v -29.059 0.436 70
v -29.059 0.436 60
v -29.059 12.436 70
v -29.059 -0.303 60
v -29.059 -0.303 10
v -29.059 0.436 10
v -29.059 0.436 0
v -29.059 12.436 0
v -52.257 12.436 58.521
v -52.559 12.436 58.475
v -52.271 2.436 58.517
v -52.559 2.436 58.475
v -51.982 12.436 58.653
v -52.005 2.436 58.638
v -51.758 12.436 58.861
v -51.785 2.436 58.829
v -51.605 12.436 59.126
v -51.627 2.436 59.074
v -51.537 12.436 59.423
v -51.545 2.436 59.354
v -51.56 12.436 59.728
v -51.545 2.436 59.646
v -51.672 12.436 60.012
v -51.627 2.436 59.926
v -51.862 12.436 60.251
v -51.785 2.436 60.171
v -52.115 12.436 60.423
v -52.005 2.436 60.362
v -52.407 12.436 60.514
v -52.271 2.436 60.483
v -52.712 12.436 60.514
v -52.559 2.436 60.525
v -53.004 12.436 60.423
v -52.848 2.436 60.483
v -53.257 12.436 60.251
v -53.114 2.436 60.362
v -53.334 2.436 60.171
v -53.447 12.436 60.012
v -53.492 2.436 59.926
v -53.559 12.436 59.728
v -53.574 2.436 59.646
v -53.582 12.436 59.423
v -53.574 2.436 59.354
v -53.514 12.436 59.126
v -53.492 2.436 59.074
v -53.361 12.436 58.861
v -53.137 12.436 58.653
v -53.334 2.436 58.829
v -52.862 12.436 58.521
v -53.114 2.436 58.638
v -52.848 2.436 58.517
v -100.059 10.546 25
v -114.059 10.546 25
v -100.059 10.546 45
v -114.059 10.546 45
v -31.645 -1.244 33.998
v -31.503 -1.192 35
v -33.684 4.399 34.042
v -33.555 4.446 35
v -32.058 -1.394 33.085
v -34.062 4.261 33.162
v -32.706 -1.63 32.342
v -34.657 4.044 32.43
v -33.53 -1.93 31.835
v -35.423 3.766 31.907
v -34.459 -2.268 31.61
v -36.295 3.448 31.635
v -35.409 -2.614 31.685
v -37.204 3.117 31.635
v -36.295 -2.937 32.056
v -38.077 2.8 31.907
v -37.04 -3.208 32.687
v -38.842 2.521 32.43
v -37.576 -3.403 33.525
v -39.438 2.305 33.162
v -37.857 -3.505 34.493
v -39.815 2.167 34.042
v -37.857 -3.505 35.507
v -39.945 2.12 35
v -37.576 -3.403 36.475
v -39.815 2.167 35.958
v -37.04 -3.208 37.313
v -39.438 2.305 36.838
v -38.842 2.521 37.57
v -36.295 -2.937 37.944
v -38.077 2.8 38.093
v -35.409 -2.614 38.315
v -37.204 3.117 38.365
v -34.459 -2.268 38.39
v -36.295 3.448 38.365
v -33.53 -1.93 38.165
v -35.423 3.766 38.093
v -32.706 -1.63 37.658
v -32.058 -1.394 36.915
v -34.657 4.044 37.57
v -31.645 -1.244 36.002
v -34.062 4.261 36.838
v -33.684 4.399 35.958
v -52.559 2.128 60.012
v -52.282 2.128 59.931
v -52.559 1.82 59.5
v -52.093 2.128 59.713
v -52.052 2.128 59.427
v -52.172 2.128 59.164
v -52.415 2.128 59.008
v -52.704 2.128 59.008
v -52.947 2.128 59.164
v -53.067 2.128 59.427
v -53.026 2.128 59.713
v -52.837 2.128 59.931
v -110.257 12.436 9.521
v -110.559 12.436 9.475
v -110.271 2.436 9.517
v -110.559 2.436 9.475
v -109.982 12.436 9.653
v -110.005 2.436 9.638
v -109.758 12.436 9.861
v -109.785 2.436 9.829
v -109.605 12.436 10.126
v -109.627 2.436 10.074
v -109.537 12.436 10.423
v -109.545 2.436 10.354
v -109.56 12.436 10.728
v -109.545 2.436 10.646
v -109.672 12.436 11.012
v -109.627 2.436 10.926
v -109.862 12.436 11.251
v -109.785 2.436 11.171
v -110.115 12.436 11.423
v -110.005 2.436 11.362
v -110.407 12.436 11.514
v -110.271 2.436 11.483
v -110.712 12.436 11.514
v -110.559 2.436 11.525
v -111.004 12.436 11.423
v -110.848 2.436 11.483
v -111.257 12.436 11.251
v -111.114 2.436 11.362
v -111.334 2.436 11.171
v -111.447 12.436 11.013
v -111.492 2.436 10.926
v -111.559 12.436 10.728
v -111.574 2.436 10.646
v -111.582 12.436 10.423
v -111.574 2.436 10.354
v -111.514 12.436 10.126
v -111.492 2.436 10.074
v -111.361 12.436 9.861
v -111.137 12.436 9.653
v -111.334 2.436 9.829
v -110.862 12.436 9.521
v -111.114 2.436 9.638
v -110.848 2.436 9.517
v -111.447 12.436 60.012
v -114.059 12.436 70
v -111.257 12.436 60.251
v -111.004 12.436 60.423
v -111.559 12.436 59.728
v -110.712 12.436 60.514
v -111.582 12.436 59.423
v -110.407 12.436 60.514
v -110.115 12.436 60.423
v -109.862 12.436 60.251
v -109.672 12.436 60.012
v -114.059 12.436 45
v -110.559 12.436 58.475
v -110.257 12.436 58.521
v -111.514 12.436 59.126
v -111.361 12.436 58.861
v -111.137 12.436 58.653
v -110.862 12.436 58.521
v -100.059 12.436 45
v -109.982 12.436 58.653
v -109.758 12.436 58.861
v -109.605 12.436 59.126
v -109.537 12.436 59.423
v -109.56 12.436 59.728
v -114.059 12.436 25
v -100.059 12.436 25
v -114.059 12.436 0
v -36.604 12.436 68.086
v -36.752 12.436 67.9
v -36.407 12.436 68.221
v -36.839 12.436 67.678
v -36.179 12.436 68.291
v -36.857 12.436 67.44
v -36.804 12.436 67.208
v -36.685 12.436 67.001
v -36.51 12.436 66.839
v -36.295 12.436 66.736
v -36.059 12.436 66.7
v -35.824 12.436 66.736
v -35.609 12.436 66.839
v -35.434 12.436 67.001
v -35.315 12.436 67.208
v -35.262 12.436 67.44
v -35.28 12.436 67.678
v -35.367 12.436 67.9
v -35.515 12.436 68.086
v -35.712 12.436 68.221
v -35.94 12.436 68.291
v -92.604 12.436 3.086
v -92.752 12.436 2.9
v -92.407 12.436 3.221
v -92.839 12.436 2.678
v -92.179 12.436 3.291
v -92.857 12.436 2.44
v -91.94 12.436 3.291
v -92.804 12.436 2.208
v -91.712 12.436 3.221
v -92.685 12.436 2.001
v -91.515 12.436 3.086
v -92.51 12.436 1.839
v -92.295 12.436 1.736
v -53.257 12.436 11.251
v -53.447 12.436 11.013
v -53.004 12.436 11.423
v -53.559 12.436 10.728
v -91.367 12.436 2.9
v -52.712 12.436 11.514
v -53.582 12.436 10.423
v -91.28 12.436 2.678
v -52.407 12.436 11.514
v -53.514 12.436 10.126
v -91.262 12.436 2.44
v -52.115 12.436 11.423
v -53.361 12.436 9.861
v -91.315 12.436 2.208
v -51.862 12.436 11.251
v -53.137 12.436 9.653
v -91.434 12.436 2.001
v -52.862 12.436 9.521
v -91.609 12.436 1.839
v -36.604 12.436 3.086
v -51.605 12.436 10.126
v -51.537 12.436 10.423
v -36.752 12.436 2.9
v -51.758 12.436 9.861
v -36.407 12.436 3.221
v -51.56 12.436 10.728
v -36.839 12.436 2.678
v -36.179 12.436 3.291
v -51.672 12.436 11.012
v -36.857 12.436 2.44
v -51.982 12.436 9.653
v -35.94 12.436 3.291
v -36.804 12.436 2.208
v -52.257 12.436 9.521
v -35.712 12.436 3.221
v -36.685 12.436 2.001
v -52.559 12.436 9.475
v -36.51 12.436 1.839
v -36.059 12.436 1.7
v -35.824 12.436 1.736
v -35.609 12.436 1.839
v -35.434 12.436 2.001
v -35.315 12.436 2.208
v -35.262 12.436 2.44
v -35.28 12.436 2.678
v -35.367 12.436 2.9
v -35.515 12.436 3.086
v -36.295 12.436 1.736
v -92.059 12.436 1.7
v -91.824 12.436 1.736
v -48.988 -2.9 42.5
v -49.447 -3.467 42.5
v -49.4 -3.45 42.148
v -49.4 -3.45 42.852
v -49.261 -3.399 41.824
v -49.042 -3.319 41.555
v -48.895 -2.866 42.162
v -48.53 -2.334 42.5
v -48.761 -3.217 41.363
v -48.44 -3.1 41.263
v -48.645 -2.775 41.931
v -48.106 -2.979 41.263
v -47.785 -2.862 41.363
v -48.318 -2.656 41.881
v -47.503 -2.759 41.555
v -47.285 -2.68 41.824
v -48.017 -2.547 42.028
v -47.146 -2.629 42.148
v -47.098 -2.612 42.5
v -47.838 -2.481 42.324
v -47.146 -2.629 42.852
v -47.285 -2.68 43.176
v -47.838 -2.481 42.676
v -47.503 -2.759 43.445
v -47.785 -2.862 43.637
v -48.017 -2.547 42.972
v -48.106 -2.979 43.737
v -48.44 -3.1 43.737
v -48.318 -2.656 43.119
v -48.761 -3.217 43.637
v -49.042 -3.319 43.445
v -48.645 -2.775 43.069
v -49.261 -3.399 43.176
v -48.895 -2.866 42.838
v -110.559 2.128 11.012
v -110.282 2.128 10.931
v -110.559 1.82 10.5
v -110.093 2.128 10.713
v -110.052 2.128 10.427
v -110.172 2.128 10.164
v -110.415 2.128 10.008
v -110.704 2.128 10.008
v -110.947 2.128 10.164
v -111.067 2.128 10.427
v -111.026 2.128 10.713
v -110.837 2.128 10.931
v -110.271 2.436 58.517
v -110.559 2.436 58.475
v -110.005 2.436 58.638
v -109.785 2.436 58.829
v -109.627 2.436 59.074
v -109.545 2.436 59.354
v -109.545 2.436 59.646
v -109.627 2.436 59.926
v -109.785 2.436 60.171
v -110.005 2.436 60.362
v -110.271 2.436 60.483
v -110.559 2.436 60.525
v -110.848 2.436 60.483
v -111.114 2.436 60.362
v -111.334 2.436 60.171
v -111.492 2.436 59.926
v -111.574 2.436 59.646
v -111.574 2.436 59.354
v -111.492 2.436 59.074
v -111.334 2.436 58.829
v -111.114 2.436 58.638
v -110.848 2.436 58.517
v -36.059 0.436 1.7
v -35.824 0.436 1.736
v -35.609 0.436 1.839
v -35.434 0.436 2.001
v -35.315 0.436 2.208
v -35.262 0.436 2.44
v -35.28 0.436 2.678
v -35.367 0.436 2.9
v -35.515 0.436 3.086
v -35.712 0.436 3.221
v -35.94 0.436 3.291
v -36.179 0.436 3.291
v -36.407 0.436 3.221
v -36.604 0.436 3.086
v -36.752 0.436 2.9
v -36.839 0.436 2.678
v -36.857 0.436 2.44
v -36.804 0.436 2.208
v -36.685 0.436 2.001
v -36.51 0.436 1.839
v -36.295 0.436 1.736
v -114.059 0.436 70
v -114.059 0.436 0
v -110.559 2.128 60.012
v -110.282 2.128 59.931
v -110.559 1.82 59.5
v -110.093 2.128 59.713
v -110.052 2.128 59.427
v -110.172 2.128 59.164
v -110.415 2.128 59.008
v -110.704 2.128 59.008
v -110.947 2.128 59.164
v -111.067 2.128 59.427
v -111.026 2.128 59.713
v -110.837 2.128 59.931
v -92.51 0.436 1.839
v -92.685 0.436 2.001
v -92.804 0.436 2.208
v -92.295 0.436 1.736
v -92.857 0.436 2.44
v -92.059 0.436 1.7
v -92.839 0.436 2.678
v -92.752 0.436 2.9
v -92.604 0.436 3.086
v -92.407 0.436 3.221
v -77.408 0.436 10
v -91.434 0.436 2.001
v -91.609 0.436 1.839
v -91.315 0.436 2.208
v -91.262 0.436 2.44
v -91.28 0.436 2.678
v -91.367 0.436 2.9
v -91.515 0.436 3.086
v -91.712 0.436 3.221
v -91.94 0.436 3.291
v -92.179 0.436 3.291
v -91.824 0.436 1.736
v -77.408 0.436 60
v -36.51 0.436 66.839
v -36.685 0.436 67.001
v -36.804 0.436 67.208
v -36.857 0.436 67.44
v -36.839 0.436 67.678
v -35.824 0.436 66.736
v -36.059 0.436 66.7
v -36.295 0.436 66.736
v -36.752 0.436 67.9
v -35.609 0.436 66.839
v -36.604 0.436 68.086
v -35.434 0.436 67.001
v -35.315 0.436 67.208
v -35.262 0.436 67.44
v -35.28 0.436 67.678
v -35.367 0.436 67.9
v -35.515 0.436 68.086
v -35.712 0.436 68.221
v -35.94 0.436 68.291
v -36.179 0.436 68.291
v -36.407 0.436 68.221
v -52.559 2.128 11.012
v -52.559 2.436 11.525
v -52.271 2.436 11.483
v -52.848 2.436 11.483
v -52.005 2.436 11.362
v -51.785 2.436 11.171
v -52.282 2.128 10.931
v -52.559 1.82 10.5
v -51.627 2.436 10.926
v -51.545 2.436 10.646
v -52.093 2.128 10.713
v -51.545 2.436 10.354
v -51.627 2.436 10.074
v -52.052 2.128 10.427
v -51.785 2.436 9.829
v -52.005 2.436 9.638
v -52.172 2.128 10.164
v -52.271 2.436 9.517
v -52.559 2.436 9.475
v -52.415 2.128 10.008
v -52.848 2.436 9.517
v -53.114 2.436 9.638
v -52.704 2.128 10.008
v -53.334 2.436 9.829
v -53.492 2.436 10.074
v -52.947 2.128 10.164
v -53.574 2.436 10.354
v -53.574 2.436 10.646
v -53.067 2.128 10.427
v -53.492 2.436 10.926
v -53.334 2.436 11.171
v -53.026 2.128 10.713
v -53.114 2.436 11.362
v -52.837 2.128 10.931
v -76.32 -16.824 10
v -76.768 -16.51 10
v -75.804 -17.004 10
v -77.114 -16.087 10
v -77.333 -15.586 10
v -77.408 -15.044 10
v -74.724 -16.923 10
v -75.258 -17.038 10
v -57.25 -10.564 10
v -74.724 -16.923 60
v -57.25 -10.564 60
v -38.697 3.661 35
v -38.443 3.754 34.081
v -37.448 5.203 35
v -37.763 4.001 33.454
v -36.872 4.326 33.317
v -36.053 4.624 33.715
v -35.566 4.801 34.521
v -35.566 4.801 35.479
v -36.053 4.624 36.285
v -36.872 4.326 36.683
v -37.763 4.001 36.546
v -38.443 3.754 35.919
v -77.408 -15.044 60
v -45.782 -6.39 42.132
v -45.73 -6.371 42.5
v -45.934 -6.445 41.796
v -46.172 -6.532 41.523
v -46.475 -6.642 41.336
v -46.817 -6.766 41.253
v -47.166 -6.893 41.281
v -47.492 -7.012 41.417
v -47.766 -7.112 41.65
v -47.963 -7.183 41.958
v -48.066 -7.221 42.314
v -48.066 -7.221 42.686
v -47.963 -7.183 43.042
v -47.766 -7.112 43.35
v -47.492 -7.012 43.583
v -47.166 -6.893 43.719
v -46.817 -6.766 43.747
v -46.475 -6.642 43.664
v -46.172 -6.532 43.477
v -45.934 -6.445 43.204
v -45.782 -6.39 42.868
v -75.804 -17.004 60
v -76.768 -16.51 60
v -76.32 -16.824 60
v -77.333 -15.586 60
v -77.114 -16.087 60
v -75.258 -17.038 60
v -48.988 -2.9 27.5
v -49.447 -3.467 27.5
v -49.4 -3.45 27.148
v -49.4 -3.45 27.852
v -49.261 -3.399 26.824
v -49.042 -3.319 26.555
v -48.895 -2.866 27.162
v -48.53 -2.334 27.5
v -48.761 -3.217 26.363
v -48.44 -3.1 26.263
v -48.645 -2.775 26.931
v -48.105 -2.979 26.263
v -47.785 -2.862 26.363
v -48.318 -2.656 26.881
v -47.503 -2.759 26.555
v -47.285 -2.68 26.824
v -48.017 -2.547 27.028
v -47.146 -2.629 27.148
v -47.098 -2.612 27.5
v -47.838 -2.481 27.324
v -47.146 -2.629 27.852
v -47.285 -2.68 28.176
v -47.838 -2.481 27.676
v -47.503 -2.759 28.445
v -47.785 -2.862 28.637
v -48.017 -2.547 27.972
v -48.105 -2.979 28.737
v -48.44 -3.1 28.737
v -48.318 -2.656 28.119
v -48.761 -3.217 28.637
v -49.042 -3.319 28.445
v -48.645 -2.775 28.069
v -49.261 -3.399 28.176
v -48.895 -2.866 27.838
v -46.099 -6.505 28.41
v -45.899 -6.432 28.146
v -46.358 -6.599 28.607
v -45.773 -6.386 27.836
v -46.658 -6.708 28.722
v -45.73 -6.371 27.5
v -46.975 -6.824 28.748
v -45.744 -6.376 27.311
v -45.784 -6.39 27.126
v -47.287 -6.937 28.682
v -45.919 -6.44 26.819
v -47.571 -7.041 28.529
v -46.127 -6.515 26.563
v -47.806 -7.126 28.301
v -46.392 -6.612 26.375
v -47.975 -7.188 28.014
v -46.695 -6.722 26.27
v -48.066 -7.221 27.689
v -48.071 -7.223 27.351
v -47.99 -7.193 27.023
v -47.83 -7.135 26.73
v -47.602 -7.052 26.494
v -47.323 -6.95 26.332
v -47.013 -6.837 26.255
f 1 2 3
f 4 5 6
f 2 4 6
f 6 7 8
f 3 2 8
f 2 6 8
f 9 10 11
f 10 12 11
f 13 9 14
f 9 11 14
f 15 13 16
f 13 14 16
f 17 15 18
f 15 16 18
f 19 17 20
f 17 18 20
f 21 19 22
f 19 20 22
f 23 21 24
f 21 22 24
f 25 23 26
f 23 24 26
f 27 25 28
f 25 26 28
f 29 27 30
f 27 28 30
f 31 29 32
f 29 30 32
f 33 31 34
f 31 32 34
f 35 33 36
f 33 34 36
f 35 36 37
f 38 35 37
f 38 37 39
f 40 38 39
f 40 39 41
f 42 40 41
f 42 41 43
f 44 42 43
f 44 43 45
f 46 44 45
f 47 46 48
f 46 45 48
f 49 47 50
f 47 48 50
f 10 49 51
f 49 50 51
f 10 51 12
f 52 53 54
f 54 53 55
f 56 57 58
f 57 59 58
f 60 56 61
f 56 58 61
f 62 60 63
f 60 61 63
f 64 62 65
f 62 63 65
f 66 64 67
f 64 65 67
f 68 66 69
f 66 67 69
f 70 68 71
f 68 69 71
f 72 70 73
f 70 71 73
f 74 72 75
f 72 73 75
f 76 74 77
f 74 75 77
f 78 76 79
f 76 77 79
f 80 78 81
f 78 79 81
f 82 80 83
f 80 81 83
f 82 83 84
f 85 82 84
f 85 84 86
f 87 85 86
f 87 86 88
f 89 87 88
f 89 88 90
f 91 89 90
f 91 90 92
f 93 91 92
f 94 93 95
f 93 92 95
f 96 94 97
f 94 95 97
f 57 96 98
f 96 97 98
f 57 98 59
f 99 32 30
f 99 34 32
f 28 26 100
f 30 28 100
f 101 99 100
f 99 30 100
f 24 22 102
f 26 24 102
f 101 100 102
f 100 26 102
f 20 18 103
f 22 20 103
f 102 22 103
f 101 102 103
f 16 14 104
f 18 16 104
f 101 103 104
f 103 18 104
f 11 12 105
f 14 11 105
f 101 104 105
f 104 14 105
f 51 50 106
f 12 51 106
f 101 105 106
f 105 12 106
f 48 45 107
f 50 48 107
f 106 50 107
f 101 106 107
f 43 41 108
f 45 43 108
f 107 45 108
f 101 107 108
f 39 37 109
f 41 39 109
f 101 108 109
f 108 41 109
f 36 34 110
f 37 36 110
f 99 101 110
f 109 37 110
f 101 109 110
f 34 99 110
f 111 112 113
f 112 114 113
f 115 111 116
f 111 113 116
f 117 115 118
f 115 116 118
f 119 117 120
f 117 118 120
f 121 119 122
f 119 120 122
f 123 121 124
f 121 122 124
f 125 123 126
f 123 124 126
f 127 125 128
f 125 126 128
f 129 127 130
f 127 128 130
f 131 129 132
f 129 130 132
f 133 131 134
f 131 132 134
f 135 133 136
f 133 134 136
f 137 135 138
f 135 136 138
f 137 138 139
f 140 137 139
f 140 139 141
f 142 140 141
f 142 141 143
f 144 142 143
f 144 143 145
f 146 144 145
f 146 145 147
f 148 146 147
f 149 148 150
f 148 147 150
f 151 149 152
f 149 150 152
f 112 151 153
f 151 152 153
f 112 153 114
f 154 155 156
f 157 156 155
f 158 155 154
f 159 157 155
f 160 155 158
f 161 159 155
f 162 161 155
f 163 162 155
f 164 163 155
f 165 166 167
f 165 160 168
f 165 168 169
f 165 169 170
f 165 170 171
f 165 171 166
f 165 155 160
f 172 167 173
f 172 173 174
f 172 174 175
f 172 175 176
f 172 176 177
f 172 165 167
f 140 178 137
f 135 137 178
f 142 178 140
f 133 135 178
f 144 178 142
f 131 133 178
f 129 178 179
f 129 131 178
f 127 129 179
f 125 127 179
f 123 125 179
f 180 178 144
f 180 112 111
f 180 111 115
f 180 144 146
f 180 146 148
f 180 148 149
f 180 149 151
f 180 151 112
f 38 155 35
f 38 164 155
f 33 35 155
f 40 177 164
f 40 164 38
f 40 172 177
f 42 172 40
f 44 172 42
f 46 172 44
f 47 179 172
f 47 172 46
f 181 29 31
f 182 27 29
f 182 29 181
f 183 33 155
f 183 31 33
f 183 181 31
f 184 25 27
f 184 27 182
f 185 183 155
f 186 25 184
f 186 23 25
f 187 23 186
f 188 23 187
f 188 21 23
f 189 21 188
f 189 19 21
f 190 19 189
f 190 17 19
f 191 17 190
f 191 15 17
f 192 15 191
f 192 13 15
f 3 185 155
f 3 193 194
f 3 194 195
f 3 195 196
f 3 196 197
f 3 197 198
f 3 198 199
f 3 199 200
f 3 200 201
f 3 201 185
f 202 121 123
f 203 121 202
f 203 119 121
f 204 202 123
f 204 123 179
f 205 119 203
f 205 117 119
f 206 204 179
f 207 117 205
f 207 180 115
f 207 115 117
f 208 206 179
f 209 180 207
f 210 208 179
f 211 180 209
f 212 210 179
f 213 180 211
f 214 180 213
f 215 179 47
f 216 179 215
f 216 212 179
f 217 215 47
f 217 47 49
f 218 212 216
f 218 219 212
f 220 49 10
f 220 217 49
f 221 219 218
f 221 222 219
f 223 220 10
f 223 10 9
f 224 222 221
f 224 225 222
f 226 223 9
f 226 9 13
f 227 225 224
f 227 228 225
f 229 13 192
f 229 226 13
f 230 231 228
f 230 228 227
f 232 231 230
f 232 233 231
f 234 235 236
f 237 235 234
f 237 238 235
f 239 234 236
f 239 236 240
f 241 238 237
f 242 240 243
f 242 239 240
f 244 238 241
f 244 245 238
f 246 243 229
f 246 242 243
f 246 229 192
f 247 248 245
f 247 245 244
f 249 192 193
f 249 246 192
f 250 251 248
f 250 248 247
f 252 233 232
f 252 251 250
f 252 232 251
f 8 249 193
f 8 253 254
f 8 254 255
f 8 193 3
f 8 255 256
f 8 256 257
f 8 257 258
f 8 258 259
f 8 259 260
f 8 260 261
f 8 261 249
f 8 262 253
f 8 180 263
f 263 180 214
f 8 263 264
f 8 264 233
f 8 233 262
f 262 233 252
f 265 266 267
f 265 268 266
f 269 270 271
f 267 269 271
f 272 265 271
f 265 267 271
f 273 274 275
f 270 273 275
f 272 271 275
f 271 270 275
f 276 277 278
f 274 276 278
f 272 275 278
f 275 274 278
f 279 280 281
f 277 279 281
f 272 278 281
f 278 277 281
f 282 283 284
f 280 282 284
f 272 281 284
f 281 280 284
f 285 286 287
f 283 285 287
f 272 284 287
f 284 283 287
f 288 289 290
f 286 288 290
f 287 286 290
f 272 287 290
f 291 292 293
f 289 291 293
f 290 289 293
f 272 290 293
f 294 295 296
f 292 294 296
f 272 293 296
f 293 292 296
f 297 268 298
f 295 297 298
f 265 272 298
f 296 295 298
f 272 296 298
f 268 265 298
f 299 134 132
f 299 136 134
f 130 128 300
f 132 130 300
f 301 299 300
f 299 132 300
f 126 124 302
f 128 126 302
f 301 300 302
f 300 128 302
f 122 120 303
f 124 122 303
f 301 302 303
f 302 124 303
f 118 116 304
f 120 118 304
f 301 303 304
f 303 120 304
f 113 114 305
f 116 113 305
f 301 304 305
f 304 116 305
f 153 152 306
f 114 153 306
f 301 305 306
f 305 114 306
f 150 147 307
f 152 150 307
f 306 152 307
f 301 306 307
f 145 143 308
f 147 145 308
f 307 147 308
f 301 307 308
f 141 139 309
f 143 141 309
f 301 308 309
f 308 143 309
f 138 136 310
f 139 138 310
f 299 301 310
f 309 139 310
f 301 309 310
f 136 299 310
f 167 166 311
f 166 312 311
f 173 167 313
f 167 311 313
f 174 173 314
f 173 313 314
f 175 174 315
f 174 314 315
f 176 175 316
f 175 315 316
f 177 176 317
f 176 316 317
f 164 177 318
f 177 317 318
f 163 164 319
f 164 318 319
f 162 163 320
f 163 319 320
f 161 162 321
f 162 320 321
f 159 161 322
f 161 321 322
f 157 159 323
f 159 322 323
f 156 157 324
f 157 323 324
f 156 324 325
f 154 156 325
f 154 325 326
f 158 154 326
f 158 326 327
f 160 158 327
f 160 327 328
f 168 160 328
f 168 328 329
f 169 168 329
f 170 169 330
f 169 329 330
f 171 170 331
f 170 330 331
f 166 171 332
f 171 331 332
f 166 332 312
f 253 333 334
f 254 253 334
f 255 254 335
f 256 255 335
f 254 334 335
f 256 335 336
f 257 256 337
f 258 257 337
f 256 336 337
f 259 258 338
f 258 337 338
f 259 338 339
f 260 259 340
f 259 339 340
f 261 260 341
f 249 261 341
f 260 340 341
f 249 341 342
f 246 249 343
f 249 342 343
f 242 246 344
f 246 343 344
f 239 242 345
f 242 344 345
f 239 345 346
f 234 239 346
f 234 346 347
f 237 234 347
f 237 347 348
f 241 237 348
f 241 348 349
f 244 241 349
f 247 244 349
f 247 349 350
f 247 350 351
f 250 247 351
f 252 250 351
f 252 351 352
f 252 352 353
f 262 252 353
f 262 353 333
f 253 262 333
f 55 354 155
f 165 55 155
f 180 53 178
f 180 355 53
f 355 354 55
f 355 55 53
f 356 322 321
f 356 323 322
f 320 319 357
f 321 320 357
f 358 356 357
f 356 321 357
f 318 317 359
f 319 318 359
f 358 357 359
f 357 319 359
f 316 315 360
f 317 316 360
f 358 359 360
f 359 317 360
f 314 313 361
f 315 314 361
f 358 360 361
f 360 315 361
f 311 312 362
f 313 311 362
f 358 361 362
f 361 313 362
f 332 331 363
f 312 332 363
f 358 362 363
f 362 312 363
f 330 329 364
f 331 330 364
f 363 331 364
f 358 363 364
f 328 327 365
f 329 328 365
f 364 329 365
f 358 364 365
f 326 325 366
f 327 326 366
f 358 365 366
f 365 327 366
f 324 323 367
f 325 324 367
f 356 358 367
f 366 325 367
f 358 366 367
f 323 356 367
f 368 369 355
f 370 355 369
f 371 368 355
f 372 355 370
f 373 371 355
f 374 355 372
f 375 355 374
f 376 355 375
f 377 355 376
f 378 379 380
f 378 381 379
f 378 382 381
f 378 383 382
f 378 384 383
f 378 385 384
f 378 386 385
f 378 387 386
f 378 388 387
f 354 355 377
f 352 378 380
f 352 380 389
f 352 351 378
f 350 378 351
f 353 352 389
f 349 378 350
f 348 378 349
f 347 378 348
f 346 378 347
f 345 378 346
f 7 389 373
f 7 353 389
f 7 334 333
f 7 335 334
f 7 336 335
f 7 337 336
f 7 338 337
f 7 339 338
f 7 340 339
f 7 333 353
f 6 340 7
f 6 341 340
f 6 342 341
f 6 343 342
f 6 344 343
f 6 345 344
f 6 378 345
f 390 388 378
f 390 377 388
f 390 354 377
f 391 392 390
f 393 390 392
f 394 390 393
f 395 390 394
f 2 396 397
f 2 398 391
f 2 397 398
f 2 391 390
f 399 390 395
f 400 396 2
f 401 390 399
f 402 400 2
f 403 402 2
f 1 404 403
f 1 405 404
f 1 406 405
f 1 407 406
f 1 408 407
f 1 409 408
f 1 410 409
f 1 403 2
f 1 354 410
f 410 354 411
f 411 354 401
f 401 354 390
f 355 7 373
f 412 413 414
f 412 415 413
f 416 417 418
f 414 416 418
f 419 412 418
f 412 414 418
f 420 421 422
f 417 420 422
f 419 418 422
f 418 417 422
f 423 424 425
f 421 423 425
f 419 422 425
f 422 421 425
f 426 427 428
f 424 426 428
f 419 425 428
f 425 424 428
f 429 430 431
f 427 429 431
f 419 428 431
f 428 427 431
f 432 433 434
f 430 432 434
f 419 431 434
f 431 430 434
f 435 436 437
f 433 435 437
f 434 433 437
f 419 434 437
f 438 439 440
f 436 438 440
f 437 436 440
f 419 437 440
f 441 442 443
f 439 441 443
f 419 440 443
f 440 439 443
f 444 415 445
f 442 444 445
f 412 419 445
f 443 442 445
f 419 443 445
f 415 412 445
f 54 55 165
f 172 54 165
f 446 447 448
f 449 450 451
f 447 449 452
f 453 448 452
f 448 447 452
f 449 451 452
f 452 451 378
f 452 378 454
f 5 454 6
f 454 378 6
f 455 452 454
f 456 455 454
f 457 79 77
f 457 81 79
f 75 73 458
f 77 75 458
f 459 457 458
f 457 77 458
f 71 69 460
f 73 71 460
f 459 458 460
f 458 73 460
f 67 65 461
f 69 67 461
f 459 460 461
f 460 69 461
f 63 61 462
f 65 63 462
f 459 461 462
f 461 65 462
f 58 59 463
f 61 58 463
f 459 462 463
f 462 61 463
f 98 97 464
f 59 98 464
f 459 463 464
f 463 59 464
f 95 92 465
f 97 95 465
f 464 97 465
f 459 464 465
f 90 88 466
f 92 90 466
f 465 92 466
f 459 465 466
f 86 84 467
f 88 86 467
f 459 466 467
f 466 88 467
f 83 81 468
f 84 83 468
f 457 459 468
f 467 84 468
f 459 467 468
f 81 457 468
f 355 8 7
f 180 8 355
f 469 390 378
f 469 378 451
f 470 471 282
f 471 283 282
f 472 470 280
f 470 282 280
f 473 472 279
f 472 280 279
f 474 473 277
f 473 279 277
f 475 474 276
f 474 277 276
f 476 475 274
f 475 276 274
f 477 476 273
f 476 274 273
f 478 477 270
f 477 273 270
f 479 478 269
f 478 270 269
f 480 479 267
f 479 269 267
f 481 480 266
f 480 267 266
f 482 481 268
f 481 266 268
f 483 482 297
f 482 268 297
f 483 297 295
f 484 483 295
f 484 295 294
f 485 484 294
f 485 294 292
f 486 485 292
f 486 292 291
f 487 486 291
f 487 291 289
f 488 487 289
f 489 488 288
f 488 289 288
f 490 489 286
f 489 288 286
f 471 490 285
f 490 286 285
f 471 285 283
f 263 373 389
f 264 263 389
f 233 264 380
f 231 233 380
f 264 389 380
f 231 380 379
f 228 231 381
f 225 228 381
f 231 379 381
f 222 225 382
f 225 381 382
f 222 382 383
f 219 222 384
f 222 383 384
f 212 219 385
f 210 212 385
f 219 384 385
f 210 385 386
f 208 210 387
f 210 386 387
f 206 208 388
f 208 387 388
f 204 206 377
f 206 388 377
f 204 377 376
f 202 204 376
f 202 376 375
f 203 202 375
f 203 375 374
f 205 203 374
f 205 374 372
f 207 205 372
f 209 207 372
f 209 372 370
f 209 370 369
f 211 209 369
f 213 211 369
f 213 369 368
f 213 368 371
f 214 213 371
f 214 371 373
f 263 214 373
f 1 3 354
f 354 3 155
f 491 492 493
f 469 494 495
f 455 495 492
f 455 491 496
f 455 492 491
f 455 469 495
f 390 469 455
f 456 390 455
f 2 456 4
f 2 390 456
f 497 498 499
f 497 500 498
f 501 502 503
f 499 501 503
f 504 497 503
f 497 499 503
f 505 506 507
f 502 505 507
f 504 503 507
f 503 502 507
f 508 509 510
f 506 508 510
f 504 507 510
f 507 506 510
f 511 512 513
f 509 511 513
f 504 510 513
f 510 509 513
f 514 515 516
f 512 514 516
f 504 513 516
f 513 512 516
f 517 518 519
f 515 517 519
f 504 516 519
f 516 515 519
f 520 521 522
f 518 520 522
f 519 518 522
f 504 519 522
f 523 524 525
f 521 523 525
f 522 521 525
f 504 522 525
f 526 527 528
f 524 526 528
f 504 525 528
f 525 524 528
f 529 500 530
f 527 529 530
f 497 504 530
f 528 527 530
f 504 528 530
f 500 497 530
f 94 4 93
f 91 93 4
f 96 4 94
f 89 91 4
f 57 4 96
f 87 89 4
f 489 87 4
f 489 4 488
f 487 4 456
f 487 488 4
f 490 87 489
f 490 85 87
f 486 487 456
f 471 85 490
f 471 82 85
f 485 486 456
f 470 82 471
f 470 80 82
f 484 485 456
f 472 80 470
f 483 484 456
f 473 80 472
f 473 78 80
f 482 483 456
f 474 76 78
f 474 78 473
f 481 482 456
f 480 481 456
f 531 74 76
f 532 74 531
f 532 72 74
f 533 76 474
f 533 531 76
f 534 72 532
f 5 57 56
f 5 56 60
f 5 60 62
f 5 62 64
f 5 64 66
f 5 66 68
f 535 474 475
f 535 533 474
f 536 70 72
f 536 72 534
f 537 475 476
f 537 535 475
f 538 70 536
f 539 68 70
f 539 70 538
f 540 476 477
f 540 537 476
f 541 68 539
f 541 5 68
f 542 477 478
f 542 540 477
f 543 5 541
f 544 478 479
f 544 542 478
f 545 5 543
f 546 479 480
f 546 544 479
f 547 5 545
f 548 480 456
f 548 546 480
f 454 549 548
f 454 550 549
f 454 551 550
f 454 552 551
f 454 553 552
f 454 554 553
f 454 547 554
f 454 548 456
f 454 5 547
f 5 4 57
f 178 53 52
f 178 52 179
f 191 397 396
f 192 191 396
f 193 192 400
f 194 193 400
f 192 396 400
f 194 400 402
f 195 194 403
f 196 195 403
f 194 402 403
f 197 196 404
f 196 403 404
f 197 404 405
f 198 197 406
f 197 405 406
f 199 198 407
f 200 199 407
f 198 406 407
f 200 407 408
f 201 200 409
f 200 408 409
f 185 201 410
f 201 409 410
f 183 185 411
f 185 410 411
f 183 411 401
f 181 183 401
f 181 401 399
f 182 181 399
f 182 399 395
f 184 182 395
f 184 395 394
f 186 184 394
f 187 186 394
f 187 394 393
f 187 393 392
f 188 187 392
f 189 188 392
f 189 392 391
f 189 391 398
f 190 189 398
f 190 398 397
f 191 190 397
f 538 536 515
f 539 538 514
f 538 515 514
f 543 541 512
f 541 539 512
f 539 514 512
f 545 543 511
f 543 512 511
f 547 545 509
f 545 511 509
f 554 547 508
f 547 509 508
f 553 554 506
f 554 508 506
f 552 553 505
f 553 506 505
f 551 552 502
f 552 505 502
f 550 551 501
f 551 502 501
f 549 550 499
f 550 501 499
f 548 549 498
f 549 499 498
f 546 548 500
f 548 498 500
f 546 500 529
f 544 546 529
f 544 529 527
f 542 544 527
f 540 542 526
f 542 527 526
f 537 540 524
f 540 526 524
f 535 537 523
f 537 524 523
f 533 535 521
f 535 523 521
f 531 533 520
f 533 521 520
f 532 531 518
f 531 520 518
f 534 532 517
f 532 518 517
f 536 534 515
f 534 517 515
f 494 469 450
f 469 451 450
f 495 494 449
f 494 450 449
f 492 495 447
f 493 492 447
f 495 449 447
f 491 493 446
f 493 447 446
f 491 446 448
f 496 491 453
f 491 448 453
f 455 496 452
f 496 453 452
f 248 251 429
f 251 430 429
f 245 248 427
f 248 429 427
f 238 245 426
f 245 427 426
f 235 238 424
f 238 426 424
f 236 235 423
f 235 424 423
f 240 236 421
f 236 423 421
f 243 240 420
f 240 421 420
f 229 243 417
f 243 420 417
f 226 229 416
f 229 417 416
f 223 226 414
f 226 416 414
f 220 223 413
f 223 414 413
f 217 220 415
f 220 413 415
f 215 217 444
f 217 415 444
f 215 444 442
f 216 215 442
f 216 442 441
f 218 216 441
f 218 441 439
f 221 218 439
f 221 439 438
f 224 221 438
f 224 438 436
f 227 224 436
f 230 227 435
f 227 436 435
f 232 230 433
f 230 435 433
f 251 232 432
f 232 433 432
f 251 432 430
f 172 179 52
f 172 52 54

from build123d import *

# Parameters (mm, degrees)
BOSS_EXTRUDE1_DEPTH             = 70
CUT_EXTRUDE1_DEPTH              = 10
CUT_EXTRUDE2_DEPTH              = 10
M2_5_TAPPED_HOLE1_D             = 2.05
M2_5_TAPPED_HOLE1_DEPTH         = 10
M2_5_TAPPED_HOLE1_TIP           = 0.615882135
SKETCH8_W                       = 20
SKETCH8_H                       = 1.89069388
CUT_EXTRUDE3_DEPTH              = 14
M8_TAPPED_HOLE1_D               = 6.8
M8_TAPPED_HOLE1_DEPTH           = 6
M8_TAPPED_HOLE1_TIP             = 2.042926105
M3_TAPPED_HOLE1_D               = 2.5
M3_TAPPED_HOLE1_DEPTH           = 4
M3_TAPPED_HOLE1_TIP             = 0.751075774
M3_TAPPED_HOLE1_ON_FACE_2_D     = 2.5
M3_TAPPED_HOLE1_ON_FACE_2_DEPTH = 4
M3_TAPPED_HOLE1_ON_FACE_2_TIP   = 0.751075774
M2_TAPPED_HOLE1_D               = 1.6
BOSS_EXTRUDE2_DEPTH             = 50
FILLET1_R                       = 2


with BuildPart() as part:
    # Sketch1 → Boss-Extrude1 (new body)
    with BuildSketch(Plane.XY):
        Polygon((-29.059463918, 12.436342138), (-29.059463918, 0.436342138), (-57.250242541, 0.436342138), (-114.059463918, 0.436342138), (-114.059463918, 12.436342138), align=None)
        Polygon((-29.059463918, -0.303053562), (-57.250242541, -10.563657862), (-57.250242541, 0.436342138), (-29.059463918, 0.436342138), align=None)
    extrude(amount=BOSS_EXTRUDE1_DEPTH)

    # Sketch2 → Cut-Extrude1 (cut)
    with BuildSketch(Plane.XY.offset(70)):
        Polygon((-57.250242541, 0.436342138), (-29.059463918, 0.436342138), (-29.059463918, -0.303053562), (-57.250242541, -10.563657862), align=None)
    extrude(amount=-CUT_EXTRUDE1_DEPTH, mode=Mode.SUBTRACT)

    # Sketch3 → Cut-Extrude2 (cut)
    with BuildSketch(Plane(origin=(0, 0, 0), x_dir=(-1, 0, 0), z_dir=(0, 0, -1))):
        Polygon((57.250242541, 0.436342138), (57.250242541, -10.563657862), (29.059463918, -0.303053562), (29.059463918, 0.436342138), align=None)
    extrude(amount=-CUT_EXTRUDE2_DEPTH, mode=Mode.SUBTRACT)

    # M2.5 Tapped Hole1
    with Locations(Plane(origin=(-110.559463918, 12.436342138, 10.5), x_dir=(0, 0, 1), z_dir=(0, 1, 0))):
        with Locations((0, 0), (49, 0), (49, 58), (0, 58)):
            Hole(M2_5_TAPPED_HOLE1_D / 2, depth=M2_5_TAPPED_HOLE1_DEPTH)
            with Locations((0, 0, -(M2_5_TAPPED_HOLE1_DEPTH + M2_5_TAPPED_HOLE1_TIP / 2))):  # 118° drill point
                Cone(0, M2_5_TAPPED_HOLE1_D / 2, M2_5_TAPPED_HOLE1_TIP, mode=Mode.SUBTRACT)

    # Sketch8 → Cut-Extrude3 (cut)
    with BuildSketch(Plane.ZY.offset(114.059463918)):
        with Locations((35, 11.490995198)):
            Rectangle(SKETCH8_W, SKETCH8_H)
    extrude(amount=-CUT_EXTRUDE3_DEPTH, mode=Mode.SUBTRACT)

    # M8 Tapped Hole1
    with Locations(Plane(origin=(-34.697619642, -2.355174422, 35), x_dir=(-0.939692620786, -0.342020143326, 0), z_dir=(0.342020143326, -0.939692620786, 0))):
        with Locations((0, 0)):
            Hole(M8_TAPPED_HOLE1_D / 2, depth=M8_TAPPED_HOLE1_DEPTH)
            with Locations((0, 0, -(M8_TAPPED_HOLE1_DEPTH + M8_TAPPED_HOLE1_TIP / 2))):  # 118° drill point
                Cone(0, M8_TAPPED_HOLE1_D / 2, M8_TAPPED_HOLE1_TIP, mode=Mode.SUBTRACT)

    # M3 Tapped Hole1
    with Locations(Plane(origin=(-46.904584862, -6.798146413, 42.5), x_dir=(-0.939692620786, -0.342020143326, 0), z_dir=(0.342020143326, -0.939692620786, 0))):
        with Locations((0, 0)):
            Hole(M3_TAPPED_HOLE1_D / 2, depth=M3_TAPPED_HOLE1_DEPTH)
            with Locations((0, 0, -(M3_TAPPED_HOLE1_DEPTH + M3_TAPPED_HOLE1_TIP / 2))):  # 118° drill point
                Cone(0, M3_TAPPED_HOLE1_D / 2, M3_TAPPED_HOLE1_TIP, mode=Mode.SUBTRACT)

    # M3 Tapped Hole1 on face 2
    with Locations(Plane(origin=(-46.904584862, -6.798146413, 27.5), x_dir=(-0.939692711209, -0.342019894889, 0), z_dir=(0.342019894889, -0.939692711209, 0))):
        with Locations((0, 0)):
            Hole(M3_TAPPED_HOLE1_ON_FACE_2_D / 2, depth=M3_TAPPED_HOLE1_ON_FACE_2_DEPTH)
            with Locations((0, 0, -(M3_TAPPED_HOLE1_ON_FACE_2_DEPTH + M3_TAPPED_HOLE1_ON_FACE_2_TIP / 2))):  # 118° drill point
                Cone(0, M3_TAPPED_HOLE1_ON_FACE_2_D / 2, M3_TAPPED_HOLE1_ON_FACE_2_TIP, mode=Mode.SUBTRACT)

    # M2 Tapped Hole1 (through all)
    with Locations(Plane(origin=(-36.059463918, 12.436342138, 67.5), x_dir=(0, 0, 1), z_dir=(0, 1, 0))):
        with Locations((0, 0), (-65, 0), (-65, -56)):
            Hole(M2_TAPPED_HOLE1_D / 2)

    # Sketch17 → Boss-Extrude2 (add)
    with BuildSketch(Plane.XY.offset(60)):
        Polygon((-57.250242541, 0.436342138), (-77.407596349, 0.436342138), (-77.407596349, -17.900334649), (-57.250242541, -10.563657862), align=None)
    extrude(amount=-BOSS_EXTRUDE2_DEPTH)

    # Fillet1
    fillet1_edges = [part.edges().sort_by_distance(p)[0] for p in [
        (-77.407596349, -17.900334649, 35),
    ]]
    fillet(fillet1_edges, radius=FILLET1_R)


solid = part.part
